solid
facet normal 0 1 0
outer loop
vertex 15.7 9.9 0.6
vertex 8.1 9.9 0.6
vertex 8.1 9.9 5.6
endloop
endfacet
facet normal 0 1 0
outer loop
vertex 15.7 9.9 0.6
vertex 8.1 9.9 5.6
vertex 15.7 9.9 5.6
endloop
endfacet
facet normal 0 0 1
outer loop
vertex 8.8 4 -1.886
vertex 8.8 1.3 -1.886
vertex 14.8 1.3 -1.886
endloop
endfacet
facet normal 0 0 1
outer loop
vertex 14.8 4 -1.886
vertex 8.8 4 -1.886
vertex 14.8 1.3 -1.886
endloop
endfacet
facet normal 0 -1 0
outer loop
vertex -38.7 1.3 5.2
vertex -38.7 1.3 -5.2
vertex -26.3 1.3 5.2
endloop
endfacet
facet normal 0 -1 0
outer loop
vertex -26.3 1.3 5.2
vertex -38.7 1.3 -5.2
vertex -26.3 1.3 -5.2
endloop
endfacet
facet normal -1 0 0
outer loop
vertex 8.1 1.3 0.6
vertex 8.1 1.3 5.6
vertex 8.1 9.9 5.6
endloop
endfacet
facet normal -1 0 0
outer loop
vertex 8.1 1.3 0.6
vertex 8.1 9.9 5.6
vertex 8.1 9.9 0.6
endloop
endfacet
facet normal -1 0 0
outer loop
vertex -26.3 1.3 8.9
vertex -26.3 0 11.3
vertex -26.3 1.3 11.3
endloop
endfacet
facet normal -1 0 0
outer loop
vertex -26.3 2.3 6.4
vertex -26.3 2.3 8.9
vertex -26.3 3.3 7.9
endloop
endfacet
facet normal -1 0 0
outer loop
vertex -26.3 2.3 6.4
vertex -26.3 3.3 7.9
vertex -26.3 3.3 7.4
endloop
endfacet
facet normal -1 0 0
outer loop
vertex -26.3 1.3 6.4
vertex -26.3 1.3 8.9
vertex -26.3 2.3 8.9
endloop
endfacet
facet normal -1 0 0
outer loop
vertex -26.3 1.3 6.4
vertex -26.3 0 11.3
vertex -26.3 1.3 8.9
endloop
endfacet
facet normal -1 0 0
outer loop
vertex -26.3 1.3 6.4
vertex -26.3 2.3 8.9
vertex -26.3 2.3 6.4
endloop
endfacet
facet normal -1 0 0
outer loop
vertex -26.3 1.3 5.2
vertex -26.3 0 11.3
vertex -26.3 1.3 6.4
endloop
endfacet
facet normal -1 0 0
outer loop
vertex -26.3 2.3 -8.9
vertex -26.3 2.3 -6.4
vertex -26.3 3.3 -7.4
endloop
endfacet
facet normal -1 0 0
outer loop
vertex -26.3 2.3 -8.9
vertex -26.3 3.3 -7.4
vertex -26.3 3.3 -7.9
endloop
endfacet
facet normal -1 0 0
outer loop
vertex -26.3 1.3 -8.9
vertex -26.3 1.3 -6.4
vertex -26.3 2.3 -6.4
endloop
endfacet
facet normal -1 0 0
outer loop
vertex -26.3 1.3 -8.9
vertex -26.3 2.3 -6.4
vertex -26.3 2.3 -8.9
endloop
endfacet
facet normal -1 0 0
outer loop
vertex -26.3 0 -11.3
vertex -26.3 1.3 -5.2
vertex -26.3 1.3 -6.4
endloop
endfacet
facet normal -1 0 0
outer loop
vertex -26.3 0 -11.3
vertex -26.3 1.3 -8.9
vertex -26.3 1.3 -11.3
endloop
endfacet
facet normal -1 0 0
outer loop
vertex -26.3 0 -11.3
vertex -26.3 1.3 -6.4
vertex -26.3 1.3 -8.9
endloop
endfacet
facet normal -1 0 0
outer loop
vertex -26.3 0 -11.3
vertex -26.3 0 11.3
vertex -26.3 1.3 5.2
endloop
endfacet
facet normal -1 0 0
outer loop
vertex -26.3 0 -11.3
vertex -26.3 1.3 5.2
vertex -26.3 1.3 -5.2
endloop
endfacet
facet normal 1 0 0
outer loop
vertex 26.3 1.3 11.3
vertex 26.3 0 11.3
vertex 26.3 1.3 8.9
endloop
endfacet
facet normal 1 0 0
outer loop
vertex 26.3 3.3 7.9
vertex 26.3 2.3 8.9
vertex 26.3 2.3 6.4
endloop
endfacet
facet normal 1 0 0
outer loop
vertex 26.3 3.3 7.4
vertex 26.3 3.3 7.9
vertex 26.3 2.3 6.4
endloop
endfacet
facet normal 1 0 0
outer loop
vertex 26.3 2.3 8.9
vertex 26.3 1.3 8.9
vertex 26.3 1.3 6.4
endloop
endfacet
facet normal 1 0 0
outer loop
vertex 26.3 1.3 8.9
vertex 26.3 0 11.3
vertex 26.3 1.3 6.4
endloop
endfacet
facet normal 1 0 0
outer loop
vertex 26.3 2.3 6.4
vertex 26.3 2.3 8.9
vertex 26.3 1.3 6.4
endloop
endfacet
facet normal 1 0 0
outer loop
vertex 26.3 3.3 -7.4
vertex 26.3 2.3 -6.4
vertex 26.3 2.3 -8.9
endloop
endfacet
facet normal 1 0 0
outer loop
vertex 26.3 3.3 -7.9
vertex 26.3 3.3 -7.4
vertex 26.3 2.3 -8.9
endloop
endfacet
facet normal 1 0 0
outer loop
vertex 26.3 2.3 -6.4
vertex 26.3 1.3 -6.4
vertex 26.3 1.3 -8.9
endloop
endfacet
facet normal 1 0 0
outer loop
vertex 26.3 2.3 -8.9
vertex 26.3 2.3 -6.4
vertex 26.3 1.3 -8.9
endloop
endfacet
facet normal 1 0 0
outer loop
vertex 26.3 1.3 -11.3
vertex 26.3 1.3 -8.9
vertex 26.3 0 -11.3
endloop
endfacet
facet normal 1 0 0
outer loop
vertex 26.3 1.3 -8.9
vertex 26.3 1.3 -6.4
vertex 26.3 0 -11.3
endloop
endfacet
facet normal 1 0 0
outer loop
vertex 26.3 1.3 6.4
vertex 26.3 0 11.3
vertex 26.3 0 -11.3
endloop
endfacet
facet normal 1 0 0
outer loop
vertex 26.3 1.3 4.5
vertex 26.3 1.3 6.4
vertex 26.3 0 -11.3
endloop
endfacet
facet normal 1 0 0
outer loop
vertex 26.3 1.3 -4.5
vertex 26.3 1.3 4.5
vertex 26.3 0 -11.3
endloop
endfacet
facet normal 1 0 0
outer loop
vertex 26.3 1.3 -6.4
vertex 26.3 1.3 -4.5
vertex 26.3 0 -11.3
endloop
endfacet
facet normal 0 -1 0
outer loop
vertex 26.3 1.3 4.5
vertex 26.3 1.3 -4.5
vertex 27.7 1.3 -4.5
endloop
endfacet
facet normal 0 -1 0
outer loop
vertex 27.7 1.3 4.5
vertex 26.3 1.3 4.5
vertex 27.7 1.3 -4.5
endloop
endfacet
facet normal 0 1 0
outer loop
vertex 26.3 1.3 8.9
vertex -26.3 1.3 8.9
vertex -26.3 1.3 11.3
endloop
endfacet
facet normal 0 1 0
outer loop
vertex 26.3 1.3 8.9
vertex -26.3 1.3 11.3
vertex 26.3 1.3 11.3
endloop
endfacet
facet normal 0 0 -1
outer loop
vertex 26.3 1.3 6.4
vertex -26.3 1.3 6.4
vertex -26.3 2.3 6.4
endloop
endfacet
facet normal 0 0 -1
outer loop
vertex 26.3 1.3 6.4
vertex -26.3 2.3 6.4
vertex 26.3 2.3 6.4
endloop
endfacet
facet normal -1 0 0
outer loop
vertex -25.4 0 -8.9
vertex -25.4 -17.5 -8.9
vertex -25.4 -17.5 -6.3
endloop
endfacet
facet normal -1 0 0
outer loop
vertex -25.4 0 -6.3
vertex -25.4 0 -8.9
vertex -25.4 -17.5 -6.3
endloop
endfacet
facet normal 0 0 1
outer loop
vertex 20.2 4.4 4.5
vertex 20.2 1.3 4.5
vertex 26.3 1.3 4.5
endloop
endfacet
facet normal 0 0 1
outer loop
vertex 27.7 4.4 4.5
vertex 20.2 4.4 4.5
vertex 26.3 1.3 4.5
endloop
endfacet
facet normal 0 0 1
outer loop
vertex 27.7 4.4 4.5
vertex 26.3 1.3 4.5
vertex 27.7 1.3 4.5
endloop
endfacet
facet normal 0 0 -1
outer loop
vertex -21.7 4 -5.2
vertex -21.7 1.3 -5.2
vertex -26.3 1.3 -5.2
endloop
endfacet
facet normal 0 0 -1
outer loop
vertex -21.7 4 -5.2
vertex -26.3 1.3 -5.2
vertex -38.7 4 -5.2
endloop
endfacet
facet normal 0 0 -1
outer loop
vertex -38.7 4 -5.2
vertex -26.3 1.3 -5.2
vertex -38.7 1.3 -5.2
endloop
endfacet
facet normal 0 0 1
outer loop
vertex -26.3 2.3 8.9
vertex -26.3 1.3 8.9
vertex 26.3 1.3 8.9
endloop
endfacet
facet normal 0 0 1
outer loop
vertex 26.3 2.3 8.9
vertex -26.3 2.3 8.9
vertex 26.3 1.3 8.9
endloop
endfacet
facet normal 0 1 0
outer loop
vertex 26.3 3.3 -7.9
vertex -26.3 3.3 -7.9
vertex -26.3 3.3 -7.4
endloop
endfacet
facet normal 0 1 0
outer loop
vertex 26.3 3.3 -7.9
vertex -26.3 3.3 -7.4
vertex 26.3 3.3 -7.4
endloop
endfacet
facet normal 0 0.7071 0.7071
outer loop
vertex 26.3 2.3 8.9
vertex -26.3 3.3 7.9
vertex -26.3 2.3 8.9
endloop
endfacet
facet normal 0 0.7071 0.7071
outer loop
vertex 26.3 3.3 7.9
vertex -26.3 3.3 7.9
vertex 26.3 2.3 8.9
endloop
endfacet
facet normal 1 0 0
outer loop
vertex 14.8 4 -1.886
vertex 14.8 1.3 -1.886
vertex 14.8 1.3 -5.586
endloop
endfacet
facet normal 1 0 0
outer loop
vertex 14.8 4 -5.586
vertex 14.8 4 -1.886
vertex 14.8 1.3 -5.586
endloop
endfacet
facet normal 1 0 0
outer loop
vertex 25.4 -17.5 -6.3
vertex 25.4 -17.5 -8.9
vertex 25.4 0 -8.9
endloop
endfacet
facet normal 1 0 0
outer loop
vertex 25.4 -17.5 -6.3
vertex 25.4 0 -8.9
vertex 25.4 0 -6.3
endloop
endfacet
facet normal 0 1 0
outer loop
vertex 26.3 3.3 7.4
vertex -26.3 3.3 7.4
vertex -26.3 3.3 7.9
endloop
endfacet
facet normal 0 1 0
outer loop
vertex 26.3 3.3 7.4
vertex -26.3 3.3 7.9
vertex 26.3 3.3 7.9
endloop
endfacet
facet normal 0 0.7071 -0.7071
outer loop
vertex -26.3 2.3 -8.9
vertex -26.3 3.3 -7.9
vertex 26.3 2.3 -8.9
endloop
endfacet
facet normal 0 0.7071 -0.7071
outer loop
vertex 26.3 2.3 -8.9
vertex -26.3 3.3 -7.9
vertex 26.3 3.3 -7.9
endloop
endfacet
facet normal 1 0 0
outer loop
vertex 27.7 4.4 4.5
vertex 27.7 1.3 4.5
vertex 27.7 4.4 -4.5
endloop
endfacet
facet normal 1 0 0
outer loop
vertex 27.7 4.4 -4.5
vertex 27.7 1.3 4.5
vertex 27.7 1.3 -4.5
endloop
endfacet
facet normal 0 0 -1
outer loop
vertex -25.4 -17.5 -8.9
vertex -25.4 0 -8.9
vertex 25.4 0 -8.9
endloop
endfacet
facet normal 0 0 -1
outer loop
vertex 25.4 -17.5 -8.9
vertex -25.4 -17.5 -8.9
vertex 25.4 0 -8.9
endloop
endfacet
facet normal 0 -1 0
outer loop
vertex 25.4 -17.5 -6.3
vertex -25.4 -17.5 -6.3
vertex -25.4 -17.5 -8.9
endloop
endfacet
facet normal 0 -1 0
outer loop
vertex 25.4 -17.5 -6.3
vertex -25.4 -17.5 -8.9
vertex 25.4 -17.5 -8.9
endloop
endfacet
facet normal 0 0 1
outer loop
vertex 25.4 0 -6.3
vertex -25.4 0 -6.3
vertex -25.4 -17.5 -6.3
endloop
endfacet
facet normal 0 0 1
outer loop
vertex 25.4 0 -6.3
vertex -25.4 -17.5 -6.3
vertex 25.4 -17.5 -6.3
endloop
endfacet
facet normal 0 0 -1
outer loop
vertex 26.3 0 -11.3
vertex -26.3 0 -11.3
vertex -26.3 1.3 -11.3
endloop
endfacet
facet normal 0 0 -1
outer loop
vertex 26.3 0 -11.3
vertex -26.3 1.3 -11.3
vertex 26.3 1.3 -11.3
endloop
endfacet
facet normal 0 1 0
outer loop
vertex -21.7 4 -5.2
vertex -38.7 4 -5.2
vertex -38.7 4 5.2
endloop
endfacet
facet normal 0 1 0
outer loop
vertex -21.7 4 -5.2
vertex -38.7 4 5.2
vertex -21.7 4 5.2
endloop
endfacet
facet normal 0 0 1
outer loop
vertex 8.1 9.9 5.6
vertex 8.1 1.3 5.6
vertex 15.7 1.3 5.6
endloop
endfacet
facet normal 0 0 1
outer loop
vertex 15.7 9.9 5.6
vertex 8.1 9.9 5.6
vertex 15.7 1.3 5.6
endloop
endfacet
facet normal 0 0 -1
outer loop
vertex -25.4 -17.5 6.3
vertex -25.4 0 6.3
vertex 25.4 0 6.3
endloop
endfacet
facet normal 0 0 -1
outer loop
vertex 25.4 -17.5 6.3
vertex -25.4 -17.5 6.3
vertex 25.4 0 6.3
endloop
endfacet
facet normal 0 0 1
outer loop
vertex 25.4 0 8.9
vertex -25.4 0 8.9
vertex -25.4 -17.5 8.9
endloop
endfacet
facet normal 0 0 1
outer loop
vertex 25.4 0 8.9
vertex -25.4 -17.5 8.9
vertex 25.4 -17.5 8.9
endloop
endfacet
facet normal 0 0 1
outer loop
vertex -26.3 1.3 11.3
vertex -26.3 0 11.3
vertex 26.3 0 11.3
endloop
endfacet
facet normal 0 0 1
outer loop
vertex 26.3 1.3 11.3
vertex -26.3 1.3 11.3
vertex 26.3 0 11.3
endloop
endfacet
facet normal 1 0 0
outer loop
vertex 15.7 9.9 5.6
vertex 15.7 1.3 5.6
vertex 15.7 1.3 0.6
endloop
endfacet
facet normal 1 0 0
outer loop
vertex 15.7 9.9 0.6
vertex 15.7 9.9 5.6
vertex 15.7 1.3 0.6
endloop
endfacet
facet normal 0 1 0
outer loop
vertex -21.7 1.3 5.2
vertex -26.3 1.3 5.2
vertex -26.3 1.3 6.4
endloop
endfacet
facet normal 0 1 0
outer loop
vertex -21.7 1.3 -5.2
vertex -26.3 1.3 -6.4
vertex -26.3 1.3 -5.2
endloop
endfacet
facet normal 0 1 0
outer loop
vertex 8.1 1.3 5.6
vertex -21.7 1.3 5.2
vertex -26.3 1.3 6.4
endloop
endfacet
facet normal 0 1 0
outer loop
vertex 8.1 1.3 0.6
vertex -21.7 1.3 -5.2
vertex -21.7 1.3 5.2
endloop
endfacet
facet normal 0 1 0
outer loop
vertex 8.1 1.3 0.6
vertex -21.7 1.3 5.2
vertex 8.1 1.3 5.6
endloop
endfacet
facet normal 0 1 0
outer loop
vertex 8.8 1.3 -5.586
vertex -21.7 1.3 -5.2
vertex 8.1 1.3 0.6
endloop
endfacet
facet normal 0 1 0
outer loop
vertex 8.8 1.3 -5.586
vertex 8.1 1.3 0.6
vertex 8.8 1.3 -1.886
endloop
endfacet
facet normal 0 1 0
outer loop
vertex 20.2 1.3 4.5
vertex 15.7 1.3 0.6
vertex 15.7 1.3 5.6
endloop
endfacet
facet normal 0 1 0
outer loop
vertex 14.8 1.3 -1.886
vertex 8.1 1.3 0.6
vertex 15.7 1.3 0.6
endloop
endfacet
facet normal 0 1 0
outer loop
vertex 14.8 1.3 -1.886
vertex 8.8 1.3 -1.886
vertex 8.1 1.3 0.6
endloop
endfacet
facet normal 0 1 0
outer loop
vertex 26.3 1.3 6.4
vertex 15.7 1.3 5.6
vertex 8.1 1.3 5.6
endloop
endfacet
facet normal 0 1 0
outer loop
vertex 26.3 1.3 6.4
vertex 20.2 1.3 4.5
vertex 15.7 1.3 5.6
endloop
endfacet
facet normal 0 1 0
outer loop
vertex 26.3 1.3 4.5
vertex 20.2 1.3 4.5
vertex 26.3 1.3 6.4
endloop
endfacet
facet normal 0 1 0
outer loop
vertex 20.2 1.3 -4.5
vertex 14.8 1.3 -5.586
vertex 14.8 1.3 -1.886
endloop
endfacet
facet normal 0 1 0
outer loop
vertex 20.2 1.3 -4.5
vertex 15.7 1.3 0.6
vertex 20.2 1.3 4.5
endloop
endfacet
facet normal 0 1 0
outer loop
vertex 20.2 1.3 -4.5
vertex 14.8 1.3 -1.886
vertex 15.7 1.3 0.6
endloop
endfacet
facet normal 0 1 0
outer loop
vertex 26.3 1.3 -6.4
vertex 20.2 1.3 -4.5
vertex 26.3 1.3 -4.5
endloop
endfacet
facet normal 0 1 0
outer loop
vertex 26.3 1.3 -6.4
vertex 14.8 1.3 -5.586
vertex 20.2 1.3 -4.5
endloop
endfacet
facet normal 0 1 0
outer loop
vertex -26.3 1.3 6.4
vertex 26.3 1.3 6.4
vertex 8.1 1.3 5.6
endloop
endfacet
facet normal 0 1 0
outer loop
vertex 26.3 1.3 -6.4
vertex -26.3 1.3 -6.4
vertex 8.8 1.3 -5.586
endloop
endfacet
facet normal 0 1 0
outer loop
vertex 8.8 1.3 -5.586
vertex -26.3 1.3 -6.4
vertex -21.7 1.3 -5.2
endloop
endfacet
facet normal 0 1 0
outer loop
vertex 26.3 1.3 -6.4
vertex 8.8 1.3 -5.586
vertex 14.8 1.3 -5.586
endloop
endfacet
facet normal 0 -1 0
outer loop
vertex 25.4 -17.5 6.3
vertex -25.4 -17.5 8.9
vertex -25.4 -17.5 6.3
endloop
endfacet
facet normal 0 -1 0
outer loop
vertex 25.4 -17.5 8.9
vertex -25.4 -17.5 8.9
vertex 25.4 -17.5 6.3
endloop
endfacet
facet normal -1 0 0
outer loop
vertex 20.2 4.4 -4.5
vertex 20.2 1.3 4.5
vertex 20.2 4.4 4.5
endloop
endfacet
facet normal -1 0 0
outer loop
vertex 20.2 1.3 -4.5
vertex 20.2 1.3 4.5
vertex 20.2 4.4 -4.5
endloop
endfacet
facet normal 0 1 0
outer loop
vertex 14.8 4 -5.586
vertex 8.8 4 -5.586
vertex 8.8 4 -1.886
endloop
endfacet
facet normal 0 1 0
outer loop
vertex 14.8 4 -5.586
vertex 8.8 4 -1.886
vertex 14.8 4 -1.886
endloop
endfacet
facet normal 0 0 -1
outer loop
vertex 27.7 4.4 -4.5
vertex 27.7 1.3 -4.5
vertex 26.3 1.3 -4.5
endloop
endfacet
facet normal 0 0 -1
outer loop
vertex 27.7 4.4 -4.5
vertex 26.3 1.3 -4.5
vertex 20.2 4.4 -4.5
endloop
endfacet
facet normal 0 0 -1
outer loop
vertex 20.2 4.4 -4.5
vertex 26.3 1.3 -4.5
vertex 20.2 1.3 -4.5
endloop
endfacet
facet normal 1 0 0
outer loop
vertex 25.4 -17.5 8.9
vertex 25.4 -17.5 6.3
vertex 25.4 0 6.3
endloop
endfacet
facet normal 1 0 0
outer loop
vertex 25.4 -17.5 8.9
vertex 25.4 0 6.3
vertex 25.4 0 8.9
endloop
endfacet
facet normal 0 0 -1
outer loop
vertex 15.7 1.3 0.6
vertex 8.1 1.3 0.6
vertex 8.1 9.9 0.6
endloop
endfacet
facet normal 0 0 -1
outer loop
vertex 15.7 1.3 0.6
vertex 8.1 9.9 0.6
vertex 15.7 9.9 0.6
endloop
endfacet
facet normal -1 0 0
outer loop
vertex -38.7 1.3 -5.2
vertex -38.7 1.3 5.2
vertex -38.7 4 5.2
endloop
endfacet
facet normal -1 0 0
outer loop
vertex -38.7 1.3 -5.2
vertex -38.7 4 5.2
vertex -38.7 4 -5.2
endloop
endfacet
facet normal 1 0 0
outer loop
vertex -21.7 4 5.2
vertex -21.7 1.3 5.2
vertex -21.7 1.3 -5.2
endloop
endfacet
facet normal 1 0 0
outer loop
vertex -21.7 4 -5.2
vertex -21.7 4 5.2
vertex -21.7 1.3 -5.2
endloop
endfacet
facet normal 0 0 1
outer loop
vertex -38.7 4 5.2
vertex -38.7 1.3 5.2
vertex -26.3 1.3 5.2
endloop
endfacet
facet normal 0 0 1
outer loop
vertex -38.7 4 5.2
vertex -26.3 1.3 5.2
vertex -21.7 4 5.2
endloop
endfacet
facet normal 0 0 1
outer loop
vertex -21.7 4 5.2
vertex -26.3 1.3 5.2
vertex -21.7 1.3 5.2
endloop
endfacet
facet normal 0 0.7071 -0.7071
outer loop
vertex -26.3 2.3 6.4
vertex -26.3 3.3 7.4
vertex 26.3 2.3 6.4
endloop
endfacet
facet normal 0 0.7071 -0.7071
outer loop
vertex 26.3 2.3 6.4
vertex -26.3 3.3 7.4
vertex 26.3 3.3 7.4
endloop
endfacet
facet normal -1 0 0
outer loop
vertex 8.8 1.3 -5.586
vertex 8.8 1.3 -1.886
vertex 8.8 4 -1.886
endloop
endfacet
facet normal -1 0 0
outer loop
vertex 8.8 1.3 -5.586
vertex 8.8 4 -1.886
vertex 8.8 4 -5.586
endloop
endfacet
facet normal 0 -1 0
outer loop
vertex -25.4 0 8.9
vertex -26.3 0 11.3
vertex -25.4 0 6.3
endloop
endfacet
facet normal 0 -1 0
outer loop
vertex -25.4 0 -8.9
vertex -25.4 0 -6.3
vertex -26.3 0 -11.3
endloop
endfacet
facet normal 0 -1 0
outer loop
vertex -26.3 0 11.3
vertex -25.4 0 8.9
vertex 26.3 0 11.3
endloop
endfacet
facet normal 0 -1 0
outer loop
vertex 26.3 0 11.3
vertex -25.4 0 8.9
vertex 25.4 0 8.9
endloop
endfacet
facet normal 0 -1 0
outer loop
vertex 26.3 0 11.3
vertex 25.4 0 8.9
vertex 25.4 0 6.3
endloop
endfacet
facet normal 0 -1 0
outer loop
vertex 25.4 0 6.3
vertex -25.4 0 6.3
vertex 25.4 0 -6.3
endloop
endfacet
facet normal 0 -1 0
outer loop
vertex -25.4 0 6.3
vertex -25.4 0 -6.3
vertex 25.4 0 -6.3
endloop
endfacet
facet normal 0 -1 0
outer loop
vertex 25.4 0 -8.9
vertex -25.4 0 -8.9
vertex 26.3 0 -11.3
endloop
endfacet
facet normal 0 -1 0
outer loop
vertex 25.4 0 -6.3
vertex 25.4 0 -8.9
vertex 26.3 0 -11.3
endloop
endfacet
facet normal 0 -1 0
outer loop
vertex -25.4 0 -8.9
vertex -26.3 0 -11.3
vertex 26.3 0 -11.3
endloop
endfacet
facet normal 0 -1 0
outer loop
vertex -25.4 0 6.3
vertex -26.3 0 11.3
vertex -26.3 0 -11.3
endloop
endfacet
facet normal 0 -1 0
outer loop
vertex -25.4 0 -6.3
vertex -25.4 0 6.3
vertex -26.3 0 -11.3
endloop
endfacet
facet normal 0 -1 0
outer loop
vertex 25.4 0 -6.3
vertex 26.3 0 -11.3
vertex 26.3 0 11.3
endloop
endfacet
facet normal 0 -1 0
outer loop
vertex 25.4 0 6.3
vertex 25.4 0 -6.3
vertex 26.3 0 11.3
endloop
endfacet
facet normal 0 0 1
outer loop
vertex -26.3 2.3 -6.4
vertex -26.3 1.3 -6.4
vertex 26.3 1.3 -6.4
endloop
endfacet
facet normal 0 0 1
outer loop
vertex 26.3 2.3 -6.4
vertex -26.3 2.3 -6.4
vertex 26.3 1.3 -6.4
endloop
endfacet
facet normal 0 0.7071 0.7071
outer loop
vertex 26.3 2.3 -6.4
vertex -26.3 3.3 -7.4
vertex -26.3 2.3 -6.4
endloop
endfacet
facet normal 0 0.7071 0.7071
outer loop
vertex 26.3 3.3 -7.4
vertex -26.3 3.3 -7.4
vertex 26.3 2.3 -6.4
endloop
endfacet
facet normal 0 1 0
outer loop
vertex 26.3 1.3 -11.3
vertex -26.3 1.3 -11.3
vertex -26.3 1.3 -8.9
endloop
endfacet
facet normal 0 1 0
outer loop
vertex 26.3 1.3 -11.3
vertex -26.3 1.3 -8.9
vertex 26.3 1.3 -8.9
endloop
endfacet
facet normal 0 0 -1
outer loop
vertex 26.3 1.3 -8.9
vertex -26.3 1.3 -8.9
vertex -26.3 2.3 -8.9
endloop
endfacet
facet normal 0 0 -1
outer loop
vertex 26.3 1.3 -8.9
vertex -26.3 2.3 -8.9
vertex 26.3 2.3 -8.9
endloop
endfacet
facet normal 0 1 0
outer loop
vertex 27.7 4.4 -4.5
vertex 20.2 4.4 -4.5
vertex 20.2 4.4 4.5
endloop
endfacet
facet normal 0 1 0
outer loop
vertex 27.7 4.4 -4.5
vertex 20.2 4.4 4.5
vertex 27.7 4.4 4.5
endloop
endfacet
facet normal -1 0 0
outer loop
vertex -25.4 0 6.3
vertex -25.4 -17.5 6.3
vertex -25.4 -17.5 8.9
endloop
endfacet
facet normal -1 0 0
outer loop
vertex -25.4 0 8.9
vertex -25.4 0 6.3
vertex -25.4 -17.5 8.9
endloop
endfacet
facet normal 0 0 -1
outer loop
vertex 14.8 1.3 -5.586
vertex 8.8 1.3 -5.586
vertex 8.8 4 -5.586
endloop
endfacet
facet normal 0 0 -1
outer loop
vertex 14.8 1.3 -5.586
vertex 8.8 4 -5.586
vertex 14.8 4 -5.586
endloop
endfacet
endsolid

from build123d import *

# Parameters (mm, degrees)
SKETCH_2_W      = 52.6
SKETCH_2_H      = 22.6
EXTRUDE_1_DEPTH = 1.3
SKETCH_3_W      = 52.6
SKETCH_3_H      = 2.5
EXTRUDE_2_DEPTH = 2
CHAMFER_1_SIZE  = 1
SKETCH_4_W      = 6.1
SKETCH_4_H      = 9
SKETCH_4_W_2    = 1.4
EXTRUDE_3_DEPTH = 3.1
SKETCH_5_W      = 12.4
SKETCH_5_H      = 10.4
SKETCH_5_W_2    = 4.6
EXTRUDE_4_DEPTH = 2.7
SKETCH_6_W      = 7.6
SKETCH_6_H      = 5
EXTRUDE_5_DEPTH = 8.6
SKETCH_7_W      = 6
SKETCH_7_H      = 3.7
EXTRUDE_6_DEPTH = 2.7
SKETCH_8_W      = 50.8
SKETCH_8_H      = 2.6
EXTRUDE_8_DEPTH = 17.5


with BuildPart() as part:
    # 草图2 → 凸台-拉伸1 (new body)
    with BuildSketch(Plane(origin=(0, 0, 0), x_dir=(1, 0, 0), z_dir=(0, 1, 0))):
        Rectangle(SKETCH_2_W, SKETCH_2_H)
    extrude(amount=EXTRUDE_1_DEPTH)

    # 草图3 → 凸台-拉伸2 (add)
    with BuildSketch(Plane(origin=(0, 1.3, 0), x_dir=(1, 0, 0), z_dir=(0, 1, 0))):
        with Locations((0, 7.65)):
            Rectangle(SKETCH_3_W, SKETCH_3_H)
        with Locations((0, -7.65)):
            Rectangle(SKETCH_3_W, SKETCH_3_H)
    extrude(amount=EXTRUDE_2_DEPTH)

    # 倒角1
    chamfer_1_edges = [part.edges().sort_by_distance(p)[0] for p in [
        (0, 3.3, -8.9),
        (0, 3.3, -6.4),
        (0, 3.3, 6.4),
        (0, 3.3, 8.9),
    ]]
    chamfer(chamfer_1_edges, length=CHAMFER_1_SIZE)

    # 草图4 → 凸台-拉伸3 (add)
    with BuildSketch(Plane(origin=(0, 1.3, 0), x_dir=(1, 0, 0), z_dir=(0, 1, 0))):
        with Locations((23.25, 0)):
            Rectangle(SKETCH_4_W, SKETCH_4_H)
        with Locations((27, 0)):
            Rectangle(SKETCH_4_W_2, SKETCH_4_H)
    extrude(amount=EXTRUDE_3_DEPTH)

    # 草图5 → 凸台-拉伸4 (add)
    with BuildSketch(Plane(origin=(0, 1.3, 0), x_dir=(1, 0, 0), z_dir=(0, 1, 0))):
        with Locations((-32.5, 0)):
            Rectangle(SKETCH_5_W, SKETCH_5_H)
        with Locations((-24, 0)):
            Rectangle(SKETCH_5_W_2, SKETCH_5_H)
    extrude(amount=EXTRUDE_4_DEPTH)

    # 草图6 → 凸台-拉伸5 (add)
    with BuildSketch(Plane(origin=(0, 1.3, 0), x_dir=(1, 0, 0), z_dir=(0, 1, 0))):
        with Locations((11.9, -3.1)):
            Rectangle(SKETCH_6_W, SKETCH_6_H)
    extrude(amount=EXTRUDE_5_DEPTH)

    # 草图7 → 凸台-拉伸6 (add)
    with BuildSketch(Plane(origin=(0, 1.3, 0), x_dir=(1, 0, 0), z_dir=(0, 1, 0))):
        with Locations((11.8, 3.735961984)):
            Rectangle(SKETCH_7_W, SKETCH_7_H)
    extrude(amount=EXTRUDE_6_DEPTH)

    # 草图8 → 凸台-拉伸8 (add)
    with BuildSketch(Plane.XZ):
        with Locations((0, -7.6)):
            Rectangle(SKETCH_8_W, SKETCH_8_H)
        with Locations((0, 7.6)):
            Rectangle(SKETCH_8_W, SKETCH_8_H)
    extrude(amount=EXTRUDE_8_DEPTH)


solid = part.part
